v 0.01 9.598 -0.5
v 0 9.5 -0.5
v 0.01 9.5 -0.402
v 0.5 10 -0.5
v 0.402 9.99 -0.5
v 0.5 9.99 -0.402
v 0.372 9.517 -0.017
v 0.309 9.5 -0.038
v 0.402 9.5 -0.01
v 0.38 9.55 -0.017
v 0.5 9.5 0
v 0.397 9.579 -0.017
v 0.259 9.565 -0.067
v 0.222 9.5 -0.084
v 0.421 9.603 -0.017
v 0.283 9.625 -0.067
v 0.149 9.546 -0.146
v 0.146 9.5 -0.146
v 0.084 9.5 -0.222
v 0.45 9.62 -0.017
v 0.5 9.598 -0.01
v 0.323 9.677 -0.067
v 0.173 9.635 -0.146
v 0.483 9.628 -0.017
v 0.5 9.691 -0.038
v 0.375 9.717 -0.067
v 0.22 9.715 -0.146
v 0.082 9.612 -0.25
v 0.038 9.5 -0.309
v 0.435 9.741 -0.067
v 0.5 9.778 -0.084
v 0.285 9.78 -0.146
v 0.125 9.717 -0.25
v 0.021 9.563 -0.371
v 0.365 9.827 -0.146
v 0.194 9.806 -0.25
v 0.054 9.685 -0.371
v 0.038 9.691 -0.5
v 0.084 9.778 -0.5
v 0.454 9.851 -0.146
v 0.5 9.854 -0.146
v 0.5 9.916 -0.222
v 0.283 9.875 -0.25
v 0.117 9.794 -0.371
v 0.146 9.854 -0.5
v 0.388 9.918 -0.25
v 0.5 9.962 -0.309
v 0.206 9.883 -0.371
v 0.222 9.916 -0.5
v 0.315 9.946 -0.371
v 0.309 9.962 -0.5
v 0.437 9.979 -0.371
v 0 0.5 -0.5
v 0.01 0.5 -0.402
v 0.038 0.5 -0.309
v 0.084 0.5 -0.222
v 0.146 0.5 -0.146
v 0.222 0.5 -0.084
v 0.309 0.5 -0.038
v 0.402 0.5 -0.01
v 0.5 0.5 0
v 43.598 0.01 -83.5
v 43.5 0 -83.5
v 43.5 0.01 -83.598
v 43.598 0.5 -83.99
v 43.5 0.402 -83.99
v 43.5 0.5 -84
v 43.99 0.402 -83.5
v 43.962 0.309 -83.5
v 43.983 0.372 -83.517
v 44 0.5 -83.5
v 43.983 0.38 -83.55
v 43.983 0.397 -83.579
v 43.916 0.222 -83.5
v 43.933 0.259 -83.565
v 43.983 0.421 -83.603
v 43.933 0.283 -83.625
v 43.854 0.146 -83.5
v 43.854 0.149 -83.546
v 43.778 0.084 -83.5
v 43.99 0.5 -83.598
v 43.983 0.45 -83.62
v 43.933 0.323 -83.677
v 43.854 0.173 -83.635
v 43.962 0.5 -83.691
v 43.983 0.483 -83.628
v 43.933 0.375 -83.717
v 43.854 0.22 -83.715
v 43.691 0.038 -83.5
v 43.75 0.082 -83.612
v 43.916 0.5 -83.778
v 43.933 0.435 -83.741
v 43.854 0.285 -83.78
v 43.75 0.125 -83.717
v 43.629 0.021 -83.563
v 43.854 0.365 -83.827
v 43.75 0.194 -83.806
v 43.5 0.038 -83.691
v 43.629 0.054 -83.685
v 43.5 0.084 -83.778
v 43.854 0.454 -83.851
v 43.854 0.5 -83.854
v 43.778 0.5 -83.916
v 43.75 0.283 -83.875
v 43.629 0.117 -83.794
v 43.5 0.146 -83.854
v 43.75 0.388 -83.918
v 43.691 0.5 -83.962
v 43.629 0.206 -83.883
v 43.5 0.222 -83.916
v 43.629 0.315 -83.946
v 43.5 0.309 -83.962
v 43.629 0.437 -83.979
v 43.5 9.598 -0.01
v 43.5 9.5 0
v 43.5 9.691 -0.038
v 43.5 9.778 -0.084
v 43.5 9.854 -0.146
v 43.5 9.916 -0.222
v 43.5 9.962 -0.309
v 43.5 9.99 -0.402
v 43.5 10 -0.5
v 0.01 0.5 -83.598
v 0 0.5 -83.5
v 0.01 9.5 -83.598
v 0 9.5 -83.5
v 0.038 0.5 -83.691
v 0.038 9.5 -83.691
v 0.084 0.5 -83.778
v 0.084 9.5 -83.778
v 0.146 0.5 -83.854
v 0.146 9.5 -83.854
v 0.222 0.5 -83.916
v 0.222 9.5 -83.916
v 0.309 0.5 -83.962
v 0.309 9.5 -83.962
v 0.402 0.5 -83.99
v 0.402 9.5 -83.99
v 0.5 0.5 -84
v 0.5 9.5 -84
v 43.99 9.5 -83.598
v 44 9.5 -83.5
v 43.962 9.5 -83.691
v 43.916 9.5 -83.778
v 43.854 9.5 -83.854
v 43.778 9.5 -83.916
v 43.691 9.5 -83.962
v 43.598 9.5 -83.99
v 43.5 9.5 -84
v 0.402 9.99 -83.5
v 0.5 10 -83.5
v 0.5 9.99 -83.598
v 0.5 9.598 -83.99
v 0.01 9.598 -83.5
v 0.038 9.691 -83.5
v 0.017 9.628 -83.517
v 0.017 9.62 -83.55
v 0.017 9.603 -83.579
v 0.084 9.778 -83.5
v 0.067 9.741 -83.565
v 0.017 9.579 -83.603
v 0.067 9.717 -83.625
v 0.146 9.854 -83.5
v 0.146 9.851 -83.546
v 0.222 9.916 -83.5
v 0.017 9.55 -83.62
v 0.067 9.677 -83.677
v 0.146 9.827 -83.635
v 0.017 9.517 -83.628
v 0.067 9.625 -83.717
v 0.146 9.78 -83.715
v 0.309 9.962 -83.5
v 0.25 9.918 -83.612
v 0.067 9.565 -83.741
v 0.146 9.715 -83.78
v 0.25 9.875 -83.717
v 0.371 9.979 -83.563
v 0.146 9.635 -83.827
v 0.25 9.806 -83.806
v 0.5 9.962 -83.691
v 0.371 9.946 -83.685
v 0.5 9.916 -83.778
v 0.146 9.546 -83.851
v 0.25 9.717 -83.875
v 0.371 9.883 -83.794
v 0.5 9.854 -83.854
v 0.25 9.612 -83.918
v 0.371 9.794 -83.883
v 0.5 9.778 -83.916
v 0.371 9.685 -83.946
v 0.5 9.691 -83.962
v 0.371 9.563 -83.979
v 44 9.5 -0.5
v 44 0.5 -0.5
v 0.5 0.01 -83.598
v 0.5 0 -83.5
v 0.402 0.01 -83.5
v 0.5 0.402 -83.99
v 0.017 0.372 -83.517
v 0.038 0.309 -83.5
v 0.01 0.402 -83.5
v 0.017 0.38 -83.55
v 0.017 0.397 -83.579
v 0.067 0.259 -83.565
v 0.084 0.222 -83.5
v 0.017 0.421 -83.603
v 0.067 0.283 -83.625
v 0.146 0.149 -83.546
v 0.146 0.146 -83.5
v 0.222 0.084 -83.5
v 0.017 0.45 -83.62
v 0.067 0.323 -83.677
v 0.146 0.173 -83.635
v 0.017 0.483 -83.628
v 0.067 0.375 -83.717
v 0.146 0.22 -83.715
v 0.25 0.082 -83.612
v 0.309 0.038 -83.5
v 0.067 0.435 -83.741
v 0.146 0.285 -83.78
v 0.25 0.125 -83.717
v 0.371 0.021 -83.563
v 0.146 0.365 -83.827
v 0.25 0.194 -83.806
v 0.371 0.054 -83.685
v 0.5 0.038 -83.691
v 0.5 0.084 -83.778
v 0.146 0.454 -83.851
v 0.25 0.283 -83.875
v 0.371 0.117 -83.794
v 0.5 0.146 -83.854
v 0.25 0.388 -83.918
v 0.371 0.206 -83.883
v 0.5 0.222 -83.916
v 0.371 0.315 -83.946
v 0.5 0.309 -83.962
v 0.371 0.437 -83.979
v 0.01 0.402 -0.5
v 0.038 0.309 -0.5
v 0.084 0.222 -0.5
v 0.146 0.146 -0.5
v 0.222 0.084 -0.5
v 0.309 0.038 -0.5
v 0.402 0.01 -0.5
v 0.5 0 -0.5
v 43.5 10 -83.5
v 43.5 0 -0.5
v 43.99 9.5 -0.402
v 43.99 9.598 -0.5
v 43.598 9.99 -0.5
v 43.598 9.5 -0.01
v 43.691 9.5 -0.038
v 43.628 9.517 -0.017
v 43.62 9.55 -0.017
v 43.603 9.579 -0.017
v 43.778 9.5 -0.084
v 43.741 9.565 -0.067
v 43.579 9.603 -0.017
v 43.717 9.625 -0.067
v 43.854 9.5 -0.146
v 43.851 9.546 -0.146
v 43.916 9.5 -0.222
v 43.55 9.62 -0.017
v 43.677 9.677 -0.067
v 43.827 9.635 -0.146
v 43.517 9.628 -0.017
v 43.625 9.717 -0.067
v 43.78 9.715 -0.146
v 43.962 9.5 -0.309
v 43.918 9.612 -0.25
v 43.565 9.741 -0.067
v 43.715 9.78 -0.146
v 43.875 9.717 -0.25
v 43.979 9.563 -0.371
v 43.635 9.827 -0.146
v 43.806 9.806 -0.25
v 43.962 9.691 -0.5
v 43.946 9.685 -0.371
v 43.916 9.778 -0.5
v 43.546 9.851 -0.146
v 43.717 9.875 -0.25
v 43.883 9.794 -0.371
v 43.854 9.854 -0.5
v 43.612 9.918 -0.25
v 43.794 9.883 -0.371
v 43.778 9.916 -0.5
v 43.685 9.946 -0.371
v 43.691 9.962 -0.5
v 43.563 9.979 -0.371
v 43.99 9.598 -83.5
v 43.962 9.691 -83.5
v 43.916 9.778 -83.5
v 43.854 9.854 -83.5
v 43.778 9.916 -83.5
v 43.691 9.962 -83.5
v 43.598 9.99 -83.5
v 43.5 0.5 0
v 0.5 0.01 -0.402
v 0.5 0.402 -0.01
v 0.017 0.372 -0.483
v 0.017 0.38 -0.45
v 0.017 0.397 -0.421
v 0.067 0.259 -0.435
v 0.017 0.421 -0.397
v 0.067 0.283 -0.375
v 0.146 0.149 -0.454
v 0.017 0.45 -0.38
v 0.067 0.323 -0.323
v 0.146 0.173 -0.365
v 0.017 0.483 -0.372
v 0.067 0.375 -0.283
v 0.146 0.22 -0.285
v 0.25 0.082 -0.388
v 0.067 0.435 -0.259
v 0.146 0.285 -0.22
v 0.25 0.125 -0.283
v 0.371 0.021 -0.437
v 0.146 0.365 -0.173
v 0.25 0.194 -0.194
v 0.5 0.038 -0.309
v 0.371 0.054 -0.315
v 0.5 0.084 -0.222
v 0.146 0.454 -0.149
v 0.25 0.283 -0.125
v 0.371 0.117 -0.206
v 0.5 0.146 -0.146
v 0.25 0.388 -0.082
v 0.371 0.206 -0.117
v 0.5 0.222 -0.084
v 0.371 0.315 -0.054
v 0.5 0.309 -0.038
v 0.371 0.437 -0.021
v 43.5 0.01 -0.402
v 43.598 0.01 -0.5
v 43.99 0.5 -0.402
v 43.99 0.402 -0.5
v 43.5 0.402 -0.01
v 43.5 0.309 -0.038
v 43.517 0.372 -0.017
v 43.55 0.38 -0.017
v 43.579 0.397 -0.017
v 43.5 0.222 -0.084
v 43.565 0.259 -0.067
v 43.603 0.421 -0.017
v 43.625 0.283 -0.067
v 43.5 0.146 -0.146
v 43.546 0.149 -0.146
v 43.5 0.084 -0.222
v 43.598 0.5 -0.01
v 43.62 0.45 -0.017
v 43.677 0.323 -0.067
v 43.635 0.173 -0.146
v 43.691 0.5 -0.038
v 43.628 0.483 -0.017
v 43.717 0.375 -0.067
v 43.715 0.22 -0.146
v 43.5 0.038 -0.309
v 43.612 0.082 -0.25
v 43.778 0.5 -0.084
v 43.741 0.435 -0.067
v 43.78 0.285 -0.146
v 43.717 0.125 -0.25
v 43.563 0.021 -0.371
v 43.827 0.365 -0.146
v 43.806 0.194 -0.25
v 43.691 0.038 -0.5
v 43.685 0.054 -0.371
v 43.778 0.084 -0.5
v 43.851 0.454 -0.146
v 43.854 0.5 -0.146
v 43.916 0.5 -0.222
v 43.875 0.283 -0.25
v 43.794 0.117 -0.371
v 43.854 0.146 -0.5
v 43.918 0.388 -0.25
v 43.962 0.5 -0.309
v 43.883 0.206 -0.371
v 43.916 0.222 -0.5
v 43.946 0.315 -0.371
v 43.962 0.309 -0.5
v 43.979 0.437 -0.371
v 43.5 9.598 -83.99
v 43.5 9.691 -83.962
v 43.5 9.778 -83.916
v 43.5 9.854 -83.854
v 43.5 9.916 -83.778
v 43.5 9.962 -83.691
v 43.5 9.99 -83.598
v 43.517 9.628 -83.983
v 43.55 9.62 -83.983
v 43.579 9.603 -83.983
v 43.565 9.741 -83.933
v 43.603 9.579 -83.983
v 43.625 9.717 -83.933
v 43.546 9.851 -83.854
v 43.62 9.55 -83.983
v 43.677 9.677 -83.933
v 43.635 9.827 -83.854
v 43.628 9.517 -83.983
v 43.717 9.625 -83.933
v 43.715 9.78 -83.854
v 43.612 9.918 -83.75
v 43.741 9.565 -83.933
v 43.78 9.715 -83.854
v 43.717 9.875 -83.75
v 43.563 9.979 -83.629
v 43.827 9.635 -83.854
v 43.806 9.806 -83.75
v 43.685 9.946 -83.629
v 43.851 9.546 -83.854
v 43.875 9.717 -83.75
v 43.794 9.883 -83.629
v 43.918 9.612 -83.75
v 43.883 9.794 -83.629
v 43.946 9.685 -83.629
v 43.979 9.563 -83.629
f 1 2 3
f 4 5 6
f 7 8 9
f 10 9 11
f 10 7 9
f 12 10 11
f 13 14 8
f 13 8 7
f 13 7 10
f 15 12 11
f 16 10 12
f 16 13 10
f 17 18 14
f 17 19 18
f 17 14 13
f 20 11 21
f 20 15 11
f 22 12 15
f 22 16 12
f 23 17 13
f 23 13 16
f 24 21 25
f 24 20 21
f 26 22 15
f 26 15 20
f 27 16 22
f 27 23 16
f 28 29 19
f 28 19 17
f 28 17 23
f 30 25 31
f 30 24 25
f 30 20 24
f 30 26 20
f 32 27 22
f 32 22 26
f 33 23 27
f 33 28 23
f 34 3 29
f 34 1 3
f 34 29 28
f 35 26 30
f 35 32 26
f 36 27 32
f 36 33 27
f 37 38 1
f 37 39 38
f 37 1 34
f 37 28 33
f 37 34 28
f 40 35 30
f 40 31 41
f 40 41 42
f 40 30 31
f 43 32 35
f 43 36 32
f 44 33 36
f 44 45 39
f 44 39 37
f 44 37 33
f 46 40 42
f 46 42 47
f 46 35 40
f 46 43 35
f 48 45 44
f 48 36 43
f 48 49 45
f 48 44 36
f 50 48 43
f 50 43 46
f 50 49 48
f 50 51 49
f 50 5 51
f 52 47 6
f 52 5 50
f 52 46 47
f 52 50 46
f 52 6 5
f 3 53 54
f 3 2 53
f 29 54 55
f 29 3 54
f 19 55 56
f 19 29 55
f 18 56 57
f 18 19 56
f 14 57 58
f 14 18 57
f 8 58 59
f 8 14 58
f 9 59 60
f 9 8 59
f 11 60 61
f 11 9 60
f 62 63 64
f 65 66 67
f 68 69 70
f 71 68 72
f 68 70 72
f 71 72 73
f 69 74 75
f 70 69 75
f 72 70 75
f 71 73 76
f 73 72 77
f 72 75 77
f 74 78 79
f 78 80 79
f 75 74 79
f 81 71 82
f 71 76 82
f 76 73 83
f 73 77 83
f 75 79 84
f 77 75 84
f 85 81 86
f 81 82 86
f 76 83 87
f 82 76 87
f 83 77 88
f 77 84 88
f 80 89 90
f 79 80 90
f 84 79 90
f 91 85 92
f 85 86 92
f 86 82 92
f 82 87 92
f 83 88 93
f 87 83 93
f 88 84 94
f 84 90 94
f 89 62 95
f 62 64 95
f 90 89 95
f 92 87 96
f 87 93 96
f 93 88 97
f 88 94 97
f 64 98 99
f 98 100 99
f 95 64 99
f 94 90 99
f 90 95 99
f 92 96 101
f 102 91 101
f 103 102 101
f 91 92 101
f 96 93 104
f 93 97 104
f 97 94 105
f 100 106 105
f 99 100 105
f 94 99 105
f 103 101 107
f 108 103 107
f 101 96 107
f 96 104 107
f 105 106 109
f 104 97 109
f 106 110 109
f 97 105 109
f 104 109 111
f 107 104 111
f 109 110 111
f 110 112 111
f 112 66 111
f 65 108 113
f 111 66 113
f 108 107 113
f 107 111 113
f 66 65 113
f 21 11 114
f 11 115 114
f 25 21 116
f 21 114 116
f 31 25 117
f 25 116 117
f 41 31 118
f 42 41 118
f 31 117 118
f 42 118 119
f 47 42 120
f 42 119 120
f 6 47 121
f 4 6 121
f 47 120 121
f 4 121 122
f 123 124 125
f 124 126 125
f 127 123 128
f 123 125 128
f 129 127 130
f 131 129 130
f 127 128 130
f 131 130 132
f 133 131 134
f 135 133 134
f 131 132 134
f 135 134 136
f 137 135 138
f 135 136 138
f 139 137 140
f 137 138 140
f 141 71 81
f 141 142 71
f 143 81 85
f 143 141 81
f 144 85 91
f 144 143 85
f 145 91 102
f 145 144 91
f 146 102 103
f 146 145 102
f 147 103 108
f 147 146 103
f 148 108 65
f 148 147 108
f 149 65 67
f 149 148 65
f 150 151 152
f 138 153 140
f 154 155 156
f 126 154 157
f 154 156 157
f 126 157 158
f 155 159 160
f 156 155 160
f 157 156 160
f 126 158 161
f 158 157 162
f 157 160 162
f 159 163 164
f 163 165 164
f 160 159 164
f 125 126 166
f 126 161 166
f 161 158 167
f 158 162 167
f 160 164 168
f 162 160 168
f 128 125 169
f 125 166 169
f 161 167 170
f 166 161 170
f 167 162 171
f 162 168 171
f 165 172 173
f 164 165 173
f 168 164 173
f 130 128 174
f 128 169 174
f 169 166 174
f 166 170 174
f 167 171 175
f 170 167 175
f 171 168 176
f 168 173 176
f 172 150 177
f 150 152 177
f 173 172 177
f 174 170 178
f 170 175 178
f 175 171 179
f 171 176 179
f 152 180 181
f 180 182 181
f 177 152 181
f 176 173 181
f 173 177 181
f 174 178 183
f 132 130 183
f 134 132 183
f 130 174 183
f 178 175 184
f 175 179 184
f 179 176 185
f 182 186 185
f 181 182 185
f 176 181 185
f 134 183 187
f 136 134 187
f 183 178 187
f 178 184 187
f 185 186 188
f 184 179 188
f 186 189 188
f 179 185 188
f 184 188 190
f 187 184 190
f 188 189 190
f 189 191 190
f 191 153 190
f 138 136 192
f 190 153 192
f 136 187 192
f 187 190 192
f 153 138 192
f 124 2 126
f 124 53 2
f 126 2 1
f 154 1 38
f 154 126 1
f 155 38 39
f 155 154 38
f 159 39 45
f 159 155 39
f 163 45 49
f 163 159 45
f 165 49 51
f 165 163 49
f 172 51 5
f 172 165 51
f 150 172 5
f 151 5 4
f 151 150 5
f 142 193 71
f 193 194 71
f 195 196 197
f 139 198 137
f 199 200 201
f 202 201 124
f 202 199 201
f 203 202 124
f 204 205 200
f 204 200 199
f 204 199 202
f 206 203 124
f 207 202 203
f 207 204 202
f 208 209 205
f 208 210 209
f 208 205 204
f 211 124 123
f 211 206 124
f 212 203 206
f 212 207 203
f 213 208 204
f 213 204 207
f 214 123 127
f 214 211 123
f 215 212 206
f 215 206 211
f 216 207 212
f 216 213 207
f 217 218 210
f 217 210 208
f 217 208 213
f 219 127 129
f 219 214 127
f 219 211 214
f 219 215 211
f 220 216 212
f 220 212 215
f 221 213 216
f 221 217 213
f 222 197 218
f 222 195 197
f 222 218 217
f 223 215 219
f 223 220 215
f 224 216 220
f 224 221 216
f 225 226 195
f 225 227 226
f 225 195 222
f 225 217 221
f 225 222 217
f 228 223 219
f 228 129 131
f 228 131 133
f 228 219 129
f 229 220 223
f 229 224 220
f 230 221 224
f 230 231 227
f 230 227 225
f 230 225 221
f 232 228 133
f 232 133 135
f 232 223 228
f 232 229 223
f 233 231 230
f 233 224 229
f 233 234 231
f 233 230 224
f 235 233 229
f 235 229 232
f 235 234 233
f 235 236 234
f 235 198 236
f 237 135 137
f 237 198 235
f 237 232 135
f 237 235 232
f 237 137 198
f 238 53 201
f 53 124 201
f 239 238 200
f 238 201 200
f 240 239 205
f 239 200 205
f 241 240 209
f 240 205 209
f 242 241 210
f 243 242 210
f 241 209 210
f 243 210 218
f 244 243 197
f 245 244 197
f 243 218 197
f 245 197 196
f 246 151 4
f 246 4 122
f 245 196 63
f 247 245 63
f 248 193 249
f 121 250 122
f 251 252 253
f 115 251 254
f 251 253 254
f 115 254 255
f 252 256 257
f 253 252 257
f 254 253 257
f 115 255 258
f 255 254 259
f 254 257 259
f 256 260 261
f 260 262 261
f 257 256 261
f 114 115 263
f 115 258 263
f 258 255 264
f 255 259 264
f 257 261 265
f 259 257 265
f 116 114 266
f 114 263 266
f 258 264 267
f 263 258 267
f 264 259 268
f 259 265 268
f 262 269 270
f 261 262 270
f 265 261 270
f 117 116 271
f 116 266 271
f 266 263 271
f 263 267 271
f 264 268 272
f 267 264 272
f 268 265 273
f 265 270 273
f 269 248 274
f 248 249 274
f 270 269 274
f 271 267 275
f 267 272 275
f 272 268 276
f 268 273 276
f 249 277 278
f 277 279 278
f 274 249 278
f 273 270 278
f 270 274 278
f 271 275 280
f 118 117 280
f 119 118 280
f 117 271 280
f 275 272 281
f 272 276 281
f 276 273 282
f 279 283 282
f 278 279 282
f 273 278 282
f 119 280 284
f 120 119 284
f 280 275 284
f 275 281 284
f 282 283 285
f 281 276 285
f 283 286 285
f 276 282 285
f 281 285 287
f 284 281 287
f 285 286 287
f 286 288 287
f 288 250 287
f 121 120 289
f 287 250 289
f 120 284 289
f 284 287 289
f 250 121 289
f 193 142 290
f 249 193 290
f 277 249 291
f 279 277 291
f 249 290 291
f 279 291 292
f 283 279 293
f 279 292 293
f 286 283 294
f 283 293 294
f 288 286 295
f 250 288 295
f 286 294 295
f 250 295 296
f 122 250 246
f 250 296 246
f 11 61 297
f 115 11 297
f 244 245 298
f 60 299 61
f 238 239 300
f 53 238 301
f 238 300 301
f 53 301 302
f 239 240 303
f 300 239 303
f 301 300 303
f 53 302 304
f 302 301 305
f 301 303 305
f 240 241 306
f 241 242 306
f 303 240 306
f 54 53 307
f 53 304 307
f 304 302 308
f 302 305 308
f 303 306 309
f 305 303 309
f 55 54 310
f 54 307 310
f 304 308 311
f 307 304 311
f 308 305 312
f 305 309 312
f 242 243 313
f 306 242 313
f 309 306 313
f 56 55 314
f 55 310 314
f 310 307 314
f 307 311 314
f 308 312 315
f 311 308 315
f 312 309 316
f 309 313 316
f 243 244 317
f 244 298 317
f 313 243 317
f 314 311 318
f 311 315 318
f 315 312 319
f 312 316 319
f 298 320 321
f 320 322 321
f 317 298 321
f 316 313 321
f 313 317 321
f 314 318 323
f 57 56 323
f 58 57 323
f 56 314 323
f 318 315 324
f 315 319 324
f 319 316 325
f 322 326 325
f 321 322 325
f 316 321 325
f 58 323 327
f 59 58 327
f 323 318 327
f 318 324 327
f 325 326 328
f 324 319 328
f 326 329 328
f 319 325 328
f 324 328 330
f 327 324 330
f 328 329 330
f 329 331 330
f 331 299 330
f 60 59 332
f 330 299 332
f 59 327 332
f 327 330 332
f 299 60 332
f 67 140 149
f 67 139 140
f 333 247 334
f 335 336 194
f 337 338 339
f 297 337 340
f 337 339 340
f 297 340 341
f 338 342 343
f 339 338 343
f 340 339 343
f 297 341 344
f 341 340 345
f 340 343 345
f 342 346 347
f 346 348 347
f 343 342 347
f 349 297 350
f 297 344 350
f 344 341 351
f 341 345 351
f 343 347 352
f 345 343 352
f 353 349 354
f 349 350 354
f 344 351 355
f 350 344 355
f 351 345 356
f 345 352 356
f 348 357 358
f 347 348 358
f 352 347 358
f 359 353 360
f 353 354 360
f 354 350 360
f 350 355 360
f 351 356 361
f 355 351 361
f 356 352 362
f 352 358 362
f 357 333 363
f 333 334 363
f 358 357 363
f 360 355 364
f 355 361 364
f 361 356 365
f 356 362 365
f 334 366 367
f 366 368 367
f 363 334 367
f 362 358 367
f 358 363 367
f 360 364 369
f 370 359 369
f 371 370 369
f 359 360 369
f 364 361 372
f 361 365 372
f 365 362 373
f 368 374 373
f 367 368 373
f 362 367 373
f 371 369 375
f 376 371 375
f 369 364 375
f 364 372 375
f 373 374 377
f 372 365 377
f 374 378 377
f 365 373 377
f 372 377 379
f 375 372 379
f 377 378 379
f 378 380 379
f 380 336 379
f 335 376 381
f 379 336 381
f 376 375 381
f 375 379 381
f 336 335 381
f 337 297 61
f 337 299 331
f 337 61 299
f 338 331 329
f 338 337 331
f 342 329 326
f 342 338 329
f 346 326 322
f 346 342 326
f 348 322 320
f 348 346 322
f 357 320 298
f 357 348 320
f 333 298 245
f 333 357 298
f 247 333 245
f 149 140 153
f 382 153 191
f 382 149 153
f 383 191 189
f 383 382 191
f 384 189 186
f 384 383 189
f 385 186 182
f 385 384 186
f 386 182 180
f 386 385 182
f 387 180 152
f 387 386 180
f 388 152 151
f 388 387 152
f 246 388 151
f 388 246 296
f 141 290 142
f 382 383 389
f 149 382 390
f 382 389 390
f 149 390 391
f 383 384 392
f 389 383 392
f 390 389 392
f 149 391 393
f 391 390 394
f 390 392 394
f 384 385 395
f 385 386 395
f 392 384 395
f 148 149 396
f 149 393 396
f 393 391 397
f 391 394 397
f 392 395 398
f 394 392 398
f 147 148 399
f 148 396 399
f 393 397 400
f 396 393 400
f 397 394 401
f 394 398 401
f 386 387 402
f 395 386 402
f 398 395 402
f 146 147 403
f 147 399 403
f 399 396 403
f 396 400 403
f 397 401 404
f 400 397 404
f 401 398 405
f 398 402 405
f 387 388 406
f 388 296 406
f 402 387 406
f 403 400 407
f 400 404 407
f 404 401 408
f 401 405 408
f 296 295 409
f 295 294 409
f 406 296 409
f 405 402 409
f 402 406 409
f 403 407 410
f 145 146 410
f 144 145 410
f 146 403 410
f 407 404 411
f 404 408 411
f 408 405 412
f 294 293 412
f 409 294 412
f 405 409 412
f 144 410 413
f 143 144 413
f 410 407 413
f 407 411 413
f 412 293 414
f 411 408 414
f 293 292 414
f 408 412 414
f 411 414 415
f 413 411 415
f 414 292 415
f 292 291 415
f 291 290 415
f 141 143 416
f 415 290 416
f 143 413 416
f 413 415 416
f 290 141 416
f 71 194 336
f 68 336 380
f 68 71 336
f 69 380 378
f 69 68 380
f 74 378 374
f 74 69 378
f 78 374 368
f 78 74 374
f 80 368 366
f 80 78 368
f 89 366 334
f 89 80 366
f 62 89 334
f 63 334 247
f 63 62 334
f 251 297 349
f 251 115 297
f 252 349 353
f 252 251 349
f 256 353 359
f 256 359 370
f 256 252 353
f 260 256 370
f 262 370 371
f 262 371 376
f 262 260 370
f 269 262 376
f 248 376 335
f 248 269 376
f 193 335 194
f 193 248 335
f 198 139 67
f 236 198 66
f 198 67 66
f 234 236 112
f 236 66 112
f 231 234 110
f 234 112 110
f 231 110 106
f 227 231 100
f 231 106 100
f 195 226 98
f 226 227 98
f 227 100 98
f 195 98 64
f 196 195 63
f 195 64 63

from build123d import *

# Parameters (mm, degrees)
CROQUIS1_W              = 44
CROQUIS1_H              = 84
SALIENTE_EXTRUIR1_DEPTH = 10
REDONDEO2_R             = 0.5


with BuildPart() as part:
    # Croquis1 → Saliente-Extruir1 (new body)
    with BuildSketch(Plane(origin=(0, 0, 0), x_dir=(1, 0, 0), z_dir=(0, 1, 0))):
        with Locations((22, 42)):
            Rectangle(CROQUIS1_W, CROQUIS1_H)
    extrude(amount=SALIENTE_EXTRUIR1_DEPTH)

    # Redondeo2
    redondeo2_edges = [part.edges().sort_by_distance(p)[0] for p in [
        (44, 10, -42),
        (22, 10, -84),
        (0, 10, -42),
        (22, 0, -84),
        (44, 0, -42),
        (22, 0, 0),
        (0, 0, -42),
        (0, 5, -84),
        (44, 5, -84),
        (44, 5, 0),
        (0, 5, 0),
        (22, 10, 0),
    ]]
    fillet(redondeo2_edges, radius=REDONDEO2_R)


solid = part.part
